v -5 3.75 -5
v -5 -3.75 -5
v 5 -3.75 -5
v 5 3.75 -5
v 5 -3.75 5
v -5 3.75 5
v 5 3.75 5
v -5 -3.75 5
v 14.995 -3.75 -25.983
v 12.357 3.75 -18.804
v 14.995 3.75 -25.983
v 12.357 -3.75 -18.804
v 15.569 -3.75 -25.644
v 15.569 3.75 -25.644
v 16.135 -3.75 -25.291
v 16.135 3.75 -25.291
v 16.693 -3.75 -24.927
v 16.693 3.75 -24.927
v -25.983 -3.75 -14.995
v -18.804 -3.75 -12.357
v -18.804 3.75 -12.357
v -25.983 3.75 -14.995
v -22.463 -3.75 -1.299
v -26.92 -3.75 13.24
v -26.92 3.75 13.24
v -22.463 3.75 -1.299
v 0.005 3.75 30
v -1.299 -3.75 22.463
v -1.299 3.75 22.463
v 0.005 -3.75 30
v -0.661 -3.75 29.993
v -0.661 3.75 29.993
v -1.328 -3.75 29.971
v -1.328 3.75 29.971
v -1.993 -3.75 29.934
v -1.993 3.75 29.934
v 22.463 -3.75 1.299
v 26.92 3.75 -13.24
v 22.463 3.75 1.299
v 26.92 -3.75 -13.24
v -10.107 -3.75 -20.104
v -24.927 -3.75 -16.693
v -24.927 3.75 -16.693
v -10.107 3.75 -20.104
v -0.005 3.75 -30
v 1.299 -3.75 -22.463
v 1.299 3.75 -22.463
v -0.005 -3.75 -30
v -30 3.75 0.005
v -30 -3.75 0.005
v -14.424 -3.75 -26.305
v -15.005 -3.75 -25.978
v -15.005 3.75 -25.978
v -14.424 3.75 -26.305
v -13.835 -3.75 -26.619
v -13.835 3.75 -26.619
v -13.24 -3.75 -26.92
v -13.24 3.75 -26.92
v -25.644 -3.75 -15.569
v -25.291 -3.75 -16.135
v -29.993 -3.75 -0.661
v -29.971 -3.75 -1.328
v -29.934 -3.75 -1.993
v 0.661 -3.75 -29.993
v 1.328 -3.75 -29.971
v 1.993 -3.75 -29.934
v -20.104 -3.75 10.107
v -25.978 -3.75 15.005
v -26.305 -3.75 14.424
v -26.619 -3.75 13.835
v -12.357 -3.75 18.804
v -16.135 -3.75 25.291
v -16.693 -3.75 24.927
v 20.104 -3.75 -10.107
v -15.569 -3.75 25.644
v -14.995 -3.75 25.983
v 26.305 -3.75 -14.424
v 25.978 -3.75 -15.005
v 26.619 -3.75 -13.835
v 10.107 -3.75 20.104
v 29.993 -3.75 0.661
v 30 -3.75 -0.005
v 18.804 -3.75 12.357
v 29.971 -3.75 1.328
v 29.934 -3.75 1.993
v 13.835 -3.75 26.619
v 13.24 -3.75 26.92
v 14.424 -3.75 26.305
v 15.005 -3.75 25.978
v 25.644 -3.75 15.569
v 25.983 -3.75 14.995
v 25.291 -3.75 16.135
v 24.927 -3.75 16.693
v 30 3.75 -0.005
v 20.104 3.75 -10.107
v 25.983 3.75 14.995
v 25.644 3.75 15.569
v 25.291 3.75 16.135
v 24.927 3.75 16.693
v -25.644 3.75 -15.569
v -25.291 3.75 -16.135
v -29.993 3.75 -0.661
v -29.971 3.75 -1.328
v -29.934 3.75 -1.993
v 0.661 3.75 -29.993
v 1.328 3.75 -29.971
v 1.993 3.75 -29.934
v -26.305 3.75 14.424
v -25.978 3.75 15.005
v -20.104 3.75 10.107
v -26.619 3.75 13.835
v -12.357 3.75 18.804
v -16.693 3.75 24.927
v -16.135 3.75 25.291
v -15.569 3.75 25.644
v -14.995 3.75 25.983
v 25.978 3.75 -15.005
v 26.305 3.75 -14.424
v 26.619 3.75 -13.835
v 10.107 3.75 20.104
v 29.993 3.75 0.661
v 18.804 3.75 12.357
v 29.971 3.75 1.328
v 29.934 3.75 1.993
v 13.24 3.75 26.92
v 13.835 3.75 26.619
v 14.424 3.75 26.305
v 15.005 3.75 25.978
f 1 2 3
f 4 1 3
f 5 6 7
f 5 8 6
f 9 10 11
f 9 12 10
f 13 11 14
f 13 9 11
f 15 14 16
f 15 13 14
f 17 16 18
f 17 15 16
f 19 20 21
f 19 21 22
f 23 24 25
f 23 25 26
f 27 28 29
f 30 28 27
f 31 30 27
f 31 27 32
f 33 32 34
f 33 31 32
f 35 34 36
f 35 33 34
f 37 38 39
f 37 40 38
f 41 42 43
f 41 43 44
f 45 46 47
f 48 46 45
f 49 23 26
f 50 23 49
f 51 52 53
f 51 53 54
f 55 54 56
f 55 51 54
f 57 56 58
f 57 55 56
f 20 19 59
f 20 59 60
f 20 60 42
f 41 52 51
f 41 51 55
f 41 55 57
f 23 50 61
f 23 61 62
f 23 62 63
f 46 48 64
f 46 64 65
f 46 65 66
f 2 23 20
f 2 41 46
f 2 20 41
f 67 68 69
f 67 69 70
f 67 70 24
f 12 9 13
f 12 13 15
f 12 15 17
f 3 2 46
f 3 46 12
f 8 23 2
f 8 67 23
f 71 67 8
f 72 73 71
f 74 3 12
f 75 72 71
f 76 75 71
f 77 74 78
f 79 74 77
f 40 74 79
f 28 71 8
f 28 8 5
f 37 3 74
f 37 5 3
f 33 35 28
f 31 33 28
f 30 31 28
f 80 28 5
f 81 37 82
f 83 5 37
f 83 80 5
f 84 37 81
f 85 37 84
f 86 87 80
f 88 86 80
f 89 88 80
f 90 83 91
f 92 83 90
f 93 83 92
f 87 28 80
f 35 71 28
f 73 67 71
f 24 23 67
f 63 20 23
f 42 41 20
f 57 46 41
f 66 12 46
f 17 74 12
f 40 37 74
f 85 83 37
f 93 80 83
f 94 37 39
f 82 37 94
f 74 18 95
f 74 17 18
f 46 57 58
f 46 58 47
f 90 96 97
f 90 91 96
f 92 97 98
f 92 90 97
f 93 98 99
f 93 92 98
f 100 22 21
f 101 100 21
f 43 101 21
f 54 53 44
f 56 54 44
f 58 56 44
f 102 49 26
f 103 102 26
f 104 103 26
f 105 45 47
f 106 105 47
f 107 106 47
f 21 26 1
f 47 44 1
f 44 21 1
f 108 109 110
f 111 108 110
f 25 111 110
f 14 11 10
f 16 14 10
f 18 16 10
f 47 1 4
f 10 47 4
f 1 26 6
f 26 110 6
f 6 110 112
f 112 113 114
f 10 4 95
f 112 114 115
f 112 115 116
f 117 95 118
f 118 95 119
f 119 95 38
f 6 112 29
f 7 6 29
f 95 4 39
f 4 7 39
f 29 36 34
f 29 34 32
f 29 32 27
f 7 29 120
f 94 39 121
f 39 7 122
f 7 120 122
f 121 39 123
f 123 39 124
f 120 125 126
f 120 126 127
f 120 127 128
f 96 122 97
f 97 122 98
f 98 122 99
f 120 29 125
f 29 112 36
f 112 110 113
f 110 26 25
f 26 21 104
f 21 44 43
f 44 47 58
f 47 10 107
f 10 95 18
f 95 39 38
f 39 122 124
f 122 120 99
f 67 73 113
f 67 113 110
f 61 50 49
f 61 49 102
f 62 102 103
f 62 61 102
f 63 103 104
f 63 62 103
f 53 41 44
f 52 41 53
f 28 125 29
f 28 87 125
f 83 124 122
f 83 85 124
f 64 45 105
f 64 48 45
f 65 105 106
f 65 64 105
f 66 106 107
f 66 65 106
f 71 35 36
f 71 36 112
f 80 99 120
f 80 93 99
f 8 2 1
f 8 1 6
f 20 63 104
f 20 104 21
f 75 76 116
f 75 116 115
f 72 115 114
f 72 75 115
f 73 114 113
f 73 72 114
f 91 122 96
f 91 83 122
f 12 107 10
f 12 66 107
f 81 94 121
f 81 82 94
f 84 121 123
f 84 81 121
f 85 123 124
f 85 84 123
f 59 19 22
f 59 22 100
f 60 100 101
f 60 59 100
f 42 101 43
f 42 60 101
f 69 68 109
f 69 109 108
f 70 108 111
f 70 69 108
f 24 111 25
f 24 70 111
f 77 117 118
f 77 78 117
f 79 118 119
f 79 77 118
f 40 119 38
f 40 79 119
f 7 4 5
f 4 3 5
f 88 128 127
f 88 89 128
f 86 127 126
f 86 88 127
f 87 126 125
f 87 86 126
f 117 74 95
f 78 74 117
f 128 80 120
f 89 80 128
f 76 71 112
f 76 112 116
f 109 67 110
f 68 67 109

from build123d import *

# Parameters (mm, degrees)
F0_W     = 10
F0_H     = 10
F1_DEPTH = 3.75


with BuildPart() as f1:
    # F0 (on Front) → F1 (new body, symmetric)
    with BuildSketch(Plane.XZ):
        with BuildLine():
            Line((13.240477, 26.920062), (-1.299121, 22.463483))
            Line((-1.299121, 22.463483), (0.005236, 30))
            ThreePointArc((0.005236, 30), (-0.994655, 29.983506), (-1.993441, 29.933697))
            Line((-1.993441, 29.933697), (-12.356813, 18.804386))
            Line((-12.356813, 18.804386), (-14.995465, 25.98338))
            ThreePointArc((-14.995465, 25.98338), (-15.85315, 25.469151), (-16.693219, 24.926621))
            Line((-16.693219, 24.926621), (-20.103507, 10.10667))
            Line((-20.103507, 10.10667), (-25.978144, 15.004534))
            ThreePointArc((-25.978144, 15.004534), (-26.463806, 14.130356), (-26.920062, 13.240477))
            Line((-26.920062, 13.240477), (-22.463483, -1.299121))
            Line((-22.463483, -1.299121), (-30, 0.005236))
            ThreePointArc((-30, 0.005236), (-29.983506, -0.994655), (-29.933697, -1.993441))
            Line((-29.933697, -1.993441), (-18.804386, -12.356813))
            Line((-18.804386, -12.356813), (-25.98338, -14.995465))
            ThreePointArc((-25.98338, -14.995465), (-25.469151, -15.85315), (-24.926621, -16.693219))
            Line((-24.926621, -16.693219), (-10.10667, -20.103507))
            Line((-10.10667, -20.103507), (-15.004534, -25.978144))
            ThreePointArc((-15.004534, -25.978144), (-14.130356, -26.463806), (-13.240477, -26.920062))
            Line((-13.240477, -26.920062), (1.299121, -22.463483))
            Line((1.299121, -22.463483), (-0.005236, -30))
            ThreePointArc((-0.005236, -30), (0.994655, -29.983506), (1.993441, -29.933697))
            Line((1.993441, -29.933697), (12.356813, -18.804386))
            Line((12.356813, -18.804386), (14.995465, -25.98338))
            ThreePointArc((14.995465, -25.98338), (15.85315, -25.469151), (16.693219, -24.926621))
            Line((16.693219, -24.926621), (20.103507, -10.10667))
            Line((20.103507, -10.10667), (25.978144, -15.004534))
            ThreePointArc((25.978144, -15.004534), (26.463806, -14.130356), (26.920062, -13.240477))
            Line((26.920062, -13.240477), (22.463483, 1.299121))
            Line((22.463483, 1.299121), (30, -0.005236))
            ThreePointArc((30, -0.005236), (29.983506, 0.994655), (29.933697, 1.993441))
            Line((29.933697, 1.993441), (18.804386, 12.356813))
            Line((18.804386, 12.356813), (25.98338, 14.995465))
            ThreePointArc((25.98338, 14.995465), (25.469151, 15.85315), (24.926621, 16.693219))
            Line((24.926621, 16.693219), (10.10667, 20.103507))
            Line((10.10667, 20.103507), (15.004534, 25.978144))
            ThreePointArc((15.004534, 25.978144), (14.130356, 26.463806), (13.240477, 26.920062))
        make_face()
        Rectangle(F0_W, F0_H, mode=Mode.SUBTRACT)
    extrude(amount=F1_DEPTH, both=True)


solid = f1.part
